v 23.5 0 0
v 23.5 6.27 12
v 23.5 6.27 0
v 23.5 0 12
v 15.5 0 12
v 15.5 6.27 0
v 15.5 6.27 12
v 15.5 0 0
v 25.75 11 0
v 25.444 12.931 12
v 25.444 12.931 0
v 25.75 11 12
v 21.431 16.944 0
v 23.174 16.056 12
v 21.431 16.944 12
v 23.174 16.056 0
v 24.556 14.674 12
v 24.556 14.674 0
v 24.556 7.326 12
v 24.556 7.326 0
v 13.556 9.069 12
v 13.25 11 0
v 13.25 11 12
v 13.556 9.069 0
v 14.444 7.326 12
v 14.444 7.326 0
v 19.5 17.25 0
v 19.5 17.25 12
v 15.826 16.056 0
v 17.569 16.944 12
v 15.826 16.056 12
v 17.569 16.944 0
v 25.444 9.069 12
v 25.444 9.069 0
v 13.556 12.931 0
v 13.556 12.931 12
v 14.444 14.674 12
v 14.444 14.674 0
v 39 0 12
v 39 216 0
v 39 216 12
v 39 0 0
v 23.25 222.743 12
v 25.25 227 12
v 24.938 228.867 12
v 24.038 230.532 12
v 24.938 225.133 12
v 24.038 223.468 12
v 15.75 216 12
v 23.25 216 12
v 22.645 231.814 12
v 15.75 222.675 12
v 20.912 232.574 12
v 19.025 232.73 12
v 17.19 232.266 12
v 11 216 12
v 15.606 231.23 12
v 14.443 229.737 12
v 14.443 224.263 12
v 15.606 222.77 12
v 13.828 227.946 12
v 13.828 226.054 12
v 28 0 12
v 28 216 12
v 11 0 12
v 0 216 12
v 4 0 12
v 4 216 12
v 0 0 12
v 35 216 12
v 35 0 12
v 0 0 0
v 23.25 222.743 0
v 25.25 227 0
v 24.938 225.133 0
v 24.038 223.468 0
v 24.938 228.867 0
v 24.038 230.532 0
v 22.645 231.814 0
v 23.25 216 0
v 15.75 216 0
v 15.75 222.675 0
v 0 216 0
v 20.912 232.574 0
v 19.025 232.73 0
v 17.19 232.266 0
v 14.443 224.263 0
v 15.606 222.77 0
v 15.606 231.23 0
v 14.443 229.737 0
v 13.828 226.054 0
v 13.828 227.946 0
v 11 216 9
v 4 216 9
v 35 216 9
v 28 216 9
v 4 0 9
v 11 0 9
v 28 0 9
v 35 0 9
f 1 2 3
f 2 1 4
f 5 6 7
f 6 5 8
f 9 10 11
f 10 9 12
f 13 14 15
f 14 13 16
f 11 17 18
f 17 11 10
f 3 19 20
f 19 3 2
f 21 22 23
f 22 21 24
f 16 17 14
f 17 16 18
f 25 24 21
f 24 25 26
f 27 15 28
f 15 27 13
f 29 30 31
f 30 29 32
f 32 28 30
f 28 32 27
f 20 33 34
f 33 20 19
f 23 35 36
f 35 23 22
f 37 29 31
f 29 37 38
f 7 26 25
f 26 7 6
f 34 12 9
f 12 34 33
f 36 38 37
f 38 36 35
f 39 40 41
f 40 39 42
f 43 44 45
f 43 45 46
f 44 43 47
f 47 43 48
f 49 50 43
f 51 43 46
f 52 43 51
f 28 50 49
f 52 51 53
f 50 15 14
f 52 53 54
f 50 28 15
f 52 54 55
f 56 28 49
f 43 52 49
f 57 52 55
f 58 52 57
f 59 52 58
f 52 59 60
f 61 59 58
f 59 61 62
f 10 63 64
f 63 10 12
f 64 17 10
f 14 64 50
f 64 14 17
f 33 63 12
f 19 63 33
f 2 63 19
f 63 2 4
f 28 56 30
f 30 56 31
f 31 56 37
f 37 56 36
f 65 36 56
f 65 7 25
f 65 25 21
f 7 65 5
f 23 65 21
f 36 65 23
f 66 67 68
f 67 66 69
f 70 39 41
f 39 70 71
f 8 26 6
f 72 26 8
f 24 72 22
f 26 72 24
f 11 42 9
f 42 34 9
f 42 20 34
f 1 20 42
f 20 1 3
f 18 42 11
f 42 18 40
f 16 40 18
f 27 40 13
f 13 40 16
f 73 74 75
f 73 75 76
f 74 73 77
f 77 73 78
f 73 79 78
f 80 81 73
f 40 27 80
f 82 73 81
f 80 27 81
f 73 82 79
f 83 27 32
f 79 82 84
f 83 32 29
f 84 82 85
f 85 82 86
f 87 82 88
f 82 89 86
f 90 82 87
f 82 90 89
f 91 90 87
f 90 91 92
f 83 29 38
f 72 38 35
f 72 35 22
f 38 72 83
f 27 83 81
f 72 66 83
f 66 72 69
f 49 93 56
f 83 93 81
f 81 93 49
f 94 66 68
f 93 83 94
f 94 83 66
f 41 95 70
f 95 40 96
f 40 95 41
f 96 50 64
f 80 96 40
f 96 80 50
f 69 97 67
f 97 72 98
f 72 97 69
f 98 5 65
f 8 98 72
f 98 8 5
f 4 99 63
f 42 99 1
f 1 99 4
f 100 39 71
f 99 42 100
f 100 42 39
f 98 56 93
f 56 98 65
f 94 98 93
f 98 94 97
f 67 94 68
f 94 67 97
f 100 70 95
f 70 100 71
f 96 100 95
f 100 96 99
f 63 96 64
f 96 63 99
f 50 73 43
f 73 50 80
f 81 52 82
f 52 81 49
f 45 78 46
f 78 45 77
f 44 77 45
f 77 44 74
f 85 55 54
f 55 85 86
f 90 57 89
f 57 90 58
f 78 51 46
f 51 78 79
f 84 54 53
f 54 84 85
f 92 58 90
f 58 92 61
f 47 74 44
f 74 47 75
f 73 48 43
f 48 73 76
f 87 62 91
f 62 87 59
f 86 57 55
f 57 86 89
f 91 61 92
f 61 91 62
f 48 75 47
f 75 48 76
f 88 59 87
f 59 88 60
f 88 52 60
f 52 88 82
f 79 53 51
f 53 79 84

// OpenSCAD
height = 12;
railWidth = 7;
railDepth = 3;
trackWidth = 39;
trackLength = 216;
sideMargin = 4;

connectorWidth = 8;
connectorLength = 12;
connectorRadius = 6.25;

module connector(sideFit, heightFit) {
    translate([(trackWidth - connectorWidth - sideFit) / 2, -1, -heightFit / 2])
    union() {
        cube([connectorWidth + sideFit, connectorLength + 1, height + heightFit]);
        translate([(connectorWidth + sideFit) / 2, connectorLength, 0])
        cylinder(height + heightFit, connectorRadius + sideFit, connectorRadius + sideFit);
    }
}

module straightTrack(length) {
    difference() {
        cube([trackWidth, length, height]);
        translate([sideMargin, -0.5 * length, height - railDepth])
            cube([railWidth, length * 2, railDepth * 2]);
        translate([trackWidth - railWidth - sideMargin, -0.5 * length, height - railDepth])
            cube([railWidth, length * 2, railDepth * 2]);
        connector(0, 2);
    }
    translate([0, length, 0])
        connector(-0.5, 0);
}

straightTrack(trackLength);
